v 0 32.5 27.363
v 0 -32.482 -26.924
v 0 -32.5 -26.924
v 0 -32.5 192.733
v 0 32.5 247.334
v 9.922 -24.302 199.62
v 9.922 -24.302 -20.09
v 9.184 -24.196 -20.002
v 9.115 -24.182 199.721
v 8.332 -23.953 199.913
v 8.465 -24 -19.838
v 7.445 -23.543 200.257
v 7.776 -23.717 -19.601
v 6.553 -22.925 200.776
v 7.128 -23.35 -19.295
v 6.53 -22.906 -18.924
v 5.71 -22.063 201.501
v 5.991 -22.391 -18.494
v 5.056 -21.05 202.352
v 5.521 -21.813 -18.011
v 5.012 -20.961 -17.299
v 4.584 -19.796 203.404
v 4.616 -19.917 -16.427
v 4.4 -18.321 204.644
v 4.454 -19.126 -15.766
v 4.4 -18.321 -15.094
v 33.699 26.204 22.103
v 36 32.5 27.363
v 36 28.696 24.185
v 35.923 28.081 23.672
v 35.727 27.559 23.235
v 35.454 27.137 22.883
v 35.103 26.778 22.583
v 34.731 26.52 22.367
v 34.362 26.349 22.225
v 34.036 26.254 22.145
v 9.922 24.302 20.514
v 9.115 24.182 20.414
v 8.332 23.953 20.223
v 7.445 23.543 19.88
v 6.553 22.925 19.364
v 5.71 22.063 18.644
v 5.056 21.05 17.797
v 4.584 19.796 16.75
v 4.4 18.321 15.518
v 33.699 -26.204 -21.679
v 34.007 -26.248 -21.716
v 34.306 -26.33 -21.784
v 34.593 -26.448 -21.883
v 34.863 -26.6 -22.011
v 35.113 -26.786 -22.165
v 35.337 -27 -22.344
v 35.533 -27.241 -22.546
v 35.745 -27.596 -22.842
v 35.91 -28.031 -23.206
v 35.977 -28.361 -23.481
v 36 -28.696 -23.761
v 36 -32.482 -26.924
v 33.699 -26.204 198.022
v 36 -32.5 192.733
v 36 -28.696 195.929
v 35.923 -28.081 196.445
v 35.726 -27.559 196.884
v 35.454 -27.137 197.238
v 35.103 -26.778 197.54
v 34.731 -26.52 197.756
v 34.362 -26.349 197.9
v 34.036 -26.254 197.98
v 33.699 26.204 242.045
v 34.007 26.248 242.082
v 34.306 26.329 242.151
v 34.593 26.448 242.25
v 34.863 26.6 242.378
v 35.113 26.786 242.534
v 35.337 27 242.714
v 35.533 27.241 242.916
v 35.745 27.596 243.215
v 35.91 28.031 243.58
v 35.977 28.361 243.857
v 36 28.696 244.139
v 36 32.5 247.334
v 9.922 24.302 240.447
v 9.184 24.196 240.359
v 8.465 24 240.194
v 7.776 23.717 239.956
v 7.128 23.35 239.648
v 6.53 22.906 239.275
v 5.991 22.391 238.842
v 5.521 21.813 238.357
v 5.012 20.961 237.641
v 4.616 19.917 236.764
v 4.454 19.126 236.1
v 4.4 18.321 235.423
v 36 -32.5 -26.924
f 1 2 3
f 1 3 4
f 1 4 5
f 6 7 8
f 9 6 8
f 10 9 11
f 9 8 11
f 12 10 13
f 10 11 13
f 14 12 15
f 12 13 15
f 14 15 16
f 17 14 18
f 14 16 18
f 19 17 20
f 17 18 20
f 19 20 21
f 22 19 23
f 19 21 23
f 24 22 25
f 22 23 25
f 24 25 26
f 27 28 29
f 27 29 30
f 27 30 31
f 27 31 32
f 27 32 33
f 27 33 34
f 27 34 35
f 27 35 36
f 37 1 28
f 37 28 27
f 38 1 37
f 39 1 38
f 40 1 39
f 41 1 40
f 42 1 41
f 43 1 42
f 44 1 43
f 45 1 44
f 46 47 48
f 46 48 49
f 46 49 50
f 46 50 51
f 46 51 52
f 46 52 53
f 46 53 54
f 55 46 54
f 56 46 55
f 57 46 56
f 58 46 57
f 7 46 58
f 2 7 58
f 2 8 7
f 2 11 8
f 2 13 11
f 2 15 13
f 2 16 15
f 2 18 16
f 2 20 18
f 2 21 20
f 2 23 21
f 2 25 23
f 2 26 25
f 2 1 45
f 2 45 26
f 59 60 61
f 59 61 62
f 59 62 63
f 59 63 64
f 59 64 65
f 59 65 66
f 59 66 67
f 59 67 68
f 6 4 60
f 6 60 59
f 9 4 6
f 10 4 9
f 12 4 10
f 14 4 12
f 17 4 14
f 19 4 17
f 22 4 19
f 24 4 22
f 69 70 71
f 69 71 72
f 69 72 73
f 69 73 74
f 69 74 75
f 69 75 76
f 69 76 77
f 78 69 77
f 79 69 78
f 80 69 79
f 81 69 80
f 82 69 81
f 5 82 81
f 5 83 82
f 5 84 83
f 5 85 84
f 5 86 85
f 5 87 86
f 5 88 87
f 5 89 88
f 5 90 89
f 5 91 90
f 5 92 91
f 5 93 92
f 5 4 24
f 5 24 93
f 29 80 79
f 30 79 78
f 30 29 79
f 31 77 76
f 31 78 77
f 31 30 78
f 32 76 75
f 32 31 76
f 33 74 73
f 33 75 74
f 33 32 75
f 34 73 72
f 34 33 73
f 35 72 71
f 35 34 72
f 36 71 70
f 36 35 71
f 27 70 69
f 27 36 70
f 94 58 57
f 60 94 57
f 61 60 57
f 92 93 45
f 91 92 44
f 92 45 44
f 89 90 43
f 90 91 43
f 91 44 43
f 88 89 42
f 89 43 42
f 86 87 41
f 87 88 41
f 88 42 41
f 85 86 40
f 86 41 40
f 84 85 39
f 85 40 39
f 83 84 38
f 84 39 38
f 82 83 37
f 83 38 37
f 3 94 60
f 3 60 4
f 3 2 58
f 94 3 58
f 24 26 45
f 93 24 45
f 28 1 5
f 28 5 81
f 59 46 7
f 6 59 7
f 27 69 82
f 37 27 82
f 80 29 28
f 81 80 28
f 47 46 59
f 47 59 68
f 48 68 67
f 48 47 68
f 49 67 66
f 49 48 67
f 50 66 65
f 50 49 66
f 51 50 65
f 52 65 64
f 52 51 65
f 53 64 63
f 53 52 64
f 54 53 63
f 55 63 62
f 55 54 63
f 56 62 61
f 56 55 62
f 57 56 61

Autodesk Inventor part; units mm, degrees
ref_plane "Начальная плоскость" through (0, 0, -26.9242) normal (0, 0, 1) x (1, 0, 0)
ref_plane "Конечная плоскость" through (0, 0, 247.3386) normal (0, 0, 1) x (1, 0, 0)
sketch "Эскиз" plane through (0, 0, 0) normal (0, 0, 1) x (1, 0, 0)
  line L0 (36, -32.5) -> (0, -32.5)
  line L1 (36, -32.5) -> (36, -28.696)
  line L2 (33.6994, -26.2039) -> (9.9215, -24.3017)
  line L3 (4.4, -18.3208) -> (4.4, 18.3208)
  line L4 (33.6994, 26.2039) -> (9.9215, 24.3017)
  line L5 (36, 28.696) -> (36, 32.5)
  line L6 (0, 32.5) -> (36, 32.5)
  line L7 (0, -32.5) -> (0, 32.5)
  arc A0 (4.4, -18.3208) -> (9.9215, -24.3017) centre (10.4, -18.3208) ccw
  arc A1 (9.9215, 24.3017) -> (4.4, 18.3208) centre (10.4, 18.3208) ccw
  arc A2 (36, -28.696) -> (33.6994, -26.2039) centre (33.5, -28.696) ccw
  arc A3 (33.6994, 26.2039) -> (36, 28.696) centre (33.5, 28.696) ccw
  line L8 (0, 45.5) -> (0, -45.5) construction
  line L9 (-7.2974, 0) -> (43.7847, 0) construction
  point P0 (36, -26.388)
  point P1 (4.4, -23.86)
  point P2 (4.4, 23.86)
  point P3 (36, 26.388)
  dimension "d3" = 36
  dimension "d5" = 4.4
  dimension "d7" = 65
  dimension "d9" = 8.64
  dimension "d11" = 8.64
  dimension "d13" = 6.112
  dimension "d15" = 6.112
  dimension "d22" = 6
  dimension "d23" = 2.5
  dimension "d24" = 32.5
  dimension "d25" = 0
extrude "Тело" add sketch "Эскиз" along normal up to surface (274.2628 mm away) from surface at -26.9242
sketch "Sketch3" plane through (0, 0, 0) normal (0, 0, 1) x (1, 0, 0)
  line L0 (0, 0) -> (10, 0)
ref_plane "Work Plane7" through (0, 0, 0) normal (0, -1, 0) x (1, 0, 0)
sketch "Sketch4" plane through (0, 0, 0) normal (0, -1, 0) x (1, 0, 0)
  line L0 (-2, -26.9242) -> (12, -26.9242)
  line L1 (-2, 247.3386) -> (12, 247.3386)
  dimension "d29" = 274.2629
ref_plane "РабПлоскость8" through (-29, 196.7514, 385.3079) normal (0, -0.6432, 0.7657) x (1, 0, 0)
split "Разделение1" plane through (-29, 196.7514, 385.3079) removes the side toward (0, -0.6432, 0.7657)
ref_plane "РабПлоскость9" through (36, 522.1937, 436.4622) normal (0, 0.6411, -0.7674) x (1, 0, 0)
split "Разделение2" plane through (36, 522.1937, 436.4622) removes the side toward (0, 0.6411, -0.7674)
equation "\"d3\" = b"
equation "\"d5\" = t1"
equation "\"d7\" = ParH"
equation "\"d9\" = msp_x1 + t2"
equation "\"d11\" = msp_x1 + t2"
equation "\"d13\" = -msp_x2 + t2"
equation "\"d15\" = -msp_x2 + t2"
equation "\"d22\" = R"
equation "\"d23\" = R1"
equation "\"d24\" = 0.5 * d7"
equation "\"d16\" = G_L"
equation "\"R1\" = 2.5"
equation "\"R\" = 6"
equation "\"t1\" = 4.4"
equation "\"t2\" = 7.2"
equation "\"ParH\" = 65"
equation "\"b\" = 36"
equation "\"msp_x1\" = 0.04 * b"
equation "\"msp_x2\" = -0.08 * t1 + 0.04 * b"
equation "\"G_L\" = d29"
equation "\"ex\" = 0"
equation "\"G_OFFSET_START\" = 26.92422"
equation "\"G_OFFSET_END\" = 27.29963"
equation "\"d26\" = -G_OFFSET_START"
equation "\"d27\" = G_OFFSET_END + B_L"
equation "\"B_L\" = 220.039"
properties part number "Швеллер 6.5U-274,26 ГОСТ 8240-97" material "Сталь, мягкая"
